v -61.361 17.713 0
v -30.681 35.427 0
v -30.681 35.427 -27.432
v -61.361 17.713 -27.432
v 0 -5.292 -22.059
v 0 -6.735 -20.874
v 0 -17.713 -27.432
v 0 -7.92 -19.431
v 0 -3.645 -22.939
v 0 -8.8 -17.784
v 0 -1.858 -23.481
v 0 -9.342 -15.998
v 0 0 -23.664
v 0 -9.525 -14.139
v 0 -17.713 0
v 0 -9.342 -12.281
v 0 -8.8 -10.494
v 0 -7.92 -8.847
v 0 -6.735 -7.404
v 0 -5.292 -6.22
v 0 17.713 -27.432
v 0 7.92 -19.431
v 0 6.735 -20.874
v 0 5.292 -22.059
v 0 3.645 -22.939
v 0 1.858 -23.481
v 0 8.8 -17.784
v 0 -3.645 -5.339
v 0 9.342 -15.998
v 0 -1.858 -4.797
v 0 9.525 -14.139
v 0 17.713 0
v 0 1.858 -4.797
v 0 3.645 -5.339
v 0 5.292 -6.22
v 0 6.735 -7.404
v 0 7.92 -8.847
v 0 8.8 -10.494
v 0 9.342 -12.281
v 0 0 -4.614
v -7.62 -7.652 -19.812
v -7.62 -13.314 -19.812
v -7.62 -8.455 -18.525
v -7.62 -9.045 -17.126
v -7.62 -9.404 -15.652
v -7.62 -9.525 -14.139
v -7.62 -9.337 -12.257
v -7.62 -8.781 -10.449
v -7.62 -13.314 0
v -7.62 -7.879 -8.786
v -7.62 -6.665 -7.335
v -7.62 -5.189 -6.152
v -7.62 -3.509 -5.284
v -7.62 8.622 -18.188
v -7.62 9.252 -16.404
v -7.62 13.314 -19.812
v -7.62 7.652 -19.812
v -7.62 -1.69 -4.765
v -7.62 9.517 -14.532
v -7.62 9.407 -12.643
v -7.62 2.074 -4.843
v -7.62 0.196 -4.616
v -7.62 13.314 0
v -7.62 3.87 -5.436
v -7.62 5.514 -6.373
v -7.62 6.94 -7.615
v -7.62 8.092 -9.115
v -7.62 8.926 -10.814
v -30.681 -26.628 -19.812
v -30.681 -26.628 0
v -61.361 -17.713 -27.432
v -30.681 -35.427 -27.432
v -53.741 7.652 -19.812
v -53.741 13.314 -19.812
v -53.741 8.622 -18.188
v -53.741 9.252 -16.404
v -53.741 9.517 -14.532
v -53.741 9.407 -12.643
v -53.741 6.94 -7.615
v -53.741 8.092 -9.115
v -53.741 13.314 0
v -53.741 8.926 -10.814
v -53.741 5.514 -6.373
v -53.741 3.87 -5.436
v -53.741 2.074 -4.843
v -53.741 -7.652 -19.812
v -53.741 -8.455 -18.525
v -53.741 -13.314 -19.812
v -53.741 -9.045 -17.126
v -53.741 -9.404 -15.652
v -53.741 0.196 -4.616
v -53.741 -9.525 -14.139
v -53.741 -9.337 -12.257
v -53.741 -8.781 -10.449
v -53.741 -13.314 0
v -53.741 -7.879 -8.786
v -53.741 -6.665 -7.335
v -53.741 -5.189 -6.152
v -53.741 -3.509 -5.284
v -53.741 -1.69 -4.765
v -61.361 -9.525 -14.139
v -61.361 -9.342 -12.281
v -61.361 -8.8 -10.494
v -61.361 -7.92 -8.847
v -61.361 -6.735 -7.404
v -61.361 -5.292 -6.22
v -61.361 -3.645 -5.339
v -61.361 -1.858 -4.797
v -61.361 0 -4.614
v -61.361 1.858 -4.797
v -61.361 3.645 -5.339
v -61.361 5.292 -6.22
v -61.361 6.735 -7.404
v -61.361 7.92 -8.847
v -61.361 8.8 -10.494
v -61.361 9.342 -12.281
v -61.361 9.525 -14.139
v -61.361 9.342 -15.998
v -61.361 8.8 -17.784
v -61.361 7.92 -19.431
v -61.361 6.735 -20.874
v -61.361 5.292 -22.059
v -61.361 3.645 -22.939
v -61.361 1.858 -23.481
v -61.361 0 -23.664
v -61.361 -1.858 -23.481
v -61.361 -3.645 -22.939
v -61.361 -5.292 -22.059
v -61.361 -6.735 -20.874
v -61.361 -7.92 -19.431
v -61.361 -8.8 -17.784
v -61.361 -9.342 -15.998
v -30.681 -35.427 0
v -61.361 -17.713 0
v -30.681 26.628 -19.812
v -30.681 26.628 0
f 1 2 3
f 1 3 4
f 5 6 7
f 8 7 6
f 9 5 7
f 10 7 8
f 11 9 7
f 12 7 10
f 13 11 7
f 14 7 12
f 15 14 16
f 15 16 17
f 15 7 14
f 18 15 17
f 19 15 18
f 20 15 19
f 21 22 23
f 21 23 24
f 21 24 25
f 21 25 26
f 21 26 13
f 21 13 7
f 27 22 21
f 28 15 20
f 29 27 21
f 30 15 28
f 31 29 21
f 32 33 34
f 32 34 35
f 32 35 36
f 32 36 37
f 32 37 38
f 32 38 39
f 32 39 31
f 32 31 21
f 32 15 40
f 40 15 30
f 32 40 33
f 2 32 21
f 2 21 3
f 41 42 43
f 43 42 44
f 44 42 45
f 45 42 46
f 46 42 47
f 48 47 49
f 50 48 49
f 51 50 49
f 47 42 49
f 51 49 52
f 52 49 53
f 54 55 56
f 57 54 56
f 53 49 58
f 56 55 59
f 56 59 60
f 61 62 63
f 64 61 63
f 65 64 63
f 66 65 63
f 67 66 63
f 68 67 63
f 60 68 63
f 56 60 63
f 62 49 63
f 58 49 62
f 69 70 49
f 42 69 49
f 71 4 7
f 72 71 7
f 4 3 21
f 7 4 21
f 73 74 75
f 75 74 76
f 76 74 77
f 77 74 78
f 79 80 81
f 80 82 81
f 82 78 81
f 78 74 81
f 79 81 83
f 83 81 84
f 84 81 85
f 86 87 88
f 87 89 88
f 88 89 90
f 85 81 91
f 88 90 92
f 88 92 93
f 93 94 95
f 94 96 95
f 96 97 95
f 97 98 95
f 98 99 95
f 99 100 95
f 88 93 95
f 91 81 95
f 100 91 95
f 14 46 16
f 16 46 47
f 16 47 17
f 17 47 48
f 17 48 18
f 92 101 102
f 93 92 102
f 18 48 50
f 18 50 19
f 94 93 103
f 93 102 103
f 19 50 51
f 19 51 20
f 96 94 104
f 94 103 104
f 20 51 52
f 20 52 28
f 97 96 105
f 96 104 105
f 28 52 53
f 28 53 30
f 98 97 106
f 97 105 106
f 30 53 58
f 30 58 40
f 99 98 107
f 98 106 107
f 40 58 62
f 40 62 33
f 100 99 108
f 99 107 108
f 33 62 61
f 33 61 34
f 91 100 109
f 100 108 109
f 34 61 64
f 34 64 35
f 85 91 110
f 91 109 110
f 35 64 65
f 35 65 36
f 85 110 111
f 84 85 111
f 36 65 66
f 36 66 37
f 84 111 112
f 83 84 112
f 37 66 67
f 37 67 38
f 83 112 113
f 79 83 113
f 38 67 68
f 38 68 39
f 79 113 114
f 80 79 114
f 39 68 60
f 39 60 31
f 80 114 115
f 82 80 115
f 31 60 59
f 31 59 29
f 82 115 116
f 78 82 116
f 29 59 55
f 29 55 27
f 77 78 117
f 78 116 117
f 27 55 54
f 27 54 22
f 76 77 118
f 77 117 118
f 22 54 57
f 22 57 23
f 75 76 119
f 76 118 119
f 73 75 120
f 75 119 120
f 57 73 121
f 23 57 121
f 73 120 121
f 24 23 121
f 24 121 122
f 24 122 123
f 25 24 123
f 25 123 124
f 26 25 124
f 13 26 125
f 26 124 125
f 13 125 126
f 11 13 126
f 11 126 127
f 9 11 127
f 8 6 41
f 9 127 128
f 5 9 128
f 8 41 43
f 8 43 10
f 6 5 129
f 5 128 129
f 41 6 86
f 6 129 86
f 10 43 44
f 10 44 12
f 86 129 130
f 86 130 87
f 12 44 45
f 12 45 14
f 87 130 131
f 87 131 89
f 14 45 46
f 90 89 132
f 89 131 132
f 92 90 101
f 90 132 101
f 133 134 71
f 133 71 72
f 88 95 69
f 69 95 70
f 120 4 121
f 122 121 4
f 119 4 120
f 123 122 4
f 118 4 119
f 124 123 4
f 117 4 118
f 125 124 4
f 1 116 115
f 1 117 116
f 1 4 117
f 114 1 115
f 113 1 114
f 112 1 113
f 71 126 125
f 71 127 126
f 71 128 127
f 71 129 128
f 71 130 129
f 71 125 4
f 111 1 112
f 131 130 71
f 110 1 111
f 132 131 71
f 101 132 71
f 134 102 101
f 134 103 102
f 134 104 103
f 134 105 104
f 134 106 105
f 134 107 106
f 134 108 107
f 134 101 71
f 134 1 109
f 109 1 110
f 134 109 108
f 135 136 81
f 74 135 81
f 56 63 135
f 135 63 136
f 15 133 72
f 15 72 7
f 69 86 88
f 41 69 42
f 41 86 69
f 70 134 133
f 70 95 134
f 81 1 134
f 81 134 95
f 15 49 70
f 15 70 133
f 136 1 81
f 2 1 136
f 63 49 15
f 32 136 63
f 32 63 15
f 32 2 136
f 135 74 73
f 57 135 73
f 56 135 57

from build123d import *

# Parameters (mm, degrees)
F2_DEPTH = 27.432
F3_T     = -7.62
F4_D     = 19.05


with BuildPart() as f2:
    # F1 (on Top) → F2 (new body)
    with BuildSketch(Plane.XY):
        Polygon((0, -17.71341), (0, 17.71341), (-30.680526, 35.42682), (-61.361052, 17.71341), (-61.361052, -17.71341), (-30.680526, -35.42682), align=None)
    extrude(amount=-F2_DEPTH)

    # F3
    f3_openings = [f2.faces().sort_by_distance(p)[0] for p in [
        (-30.680526, 0, 0),
    ]]
    offset(amount=F3_T, openings=f3_openings)

    # F4 (through all)
    with Locations(Plane.YZ):
        with Locations((0, -14.139283)):
            Hole(F4_D / 2)


solid = f2.part
